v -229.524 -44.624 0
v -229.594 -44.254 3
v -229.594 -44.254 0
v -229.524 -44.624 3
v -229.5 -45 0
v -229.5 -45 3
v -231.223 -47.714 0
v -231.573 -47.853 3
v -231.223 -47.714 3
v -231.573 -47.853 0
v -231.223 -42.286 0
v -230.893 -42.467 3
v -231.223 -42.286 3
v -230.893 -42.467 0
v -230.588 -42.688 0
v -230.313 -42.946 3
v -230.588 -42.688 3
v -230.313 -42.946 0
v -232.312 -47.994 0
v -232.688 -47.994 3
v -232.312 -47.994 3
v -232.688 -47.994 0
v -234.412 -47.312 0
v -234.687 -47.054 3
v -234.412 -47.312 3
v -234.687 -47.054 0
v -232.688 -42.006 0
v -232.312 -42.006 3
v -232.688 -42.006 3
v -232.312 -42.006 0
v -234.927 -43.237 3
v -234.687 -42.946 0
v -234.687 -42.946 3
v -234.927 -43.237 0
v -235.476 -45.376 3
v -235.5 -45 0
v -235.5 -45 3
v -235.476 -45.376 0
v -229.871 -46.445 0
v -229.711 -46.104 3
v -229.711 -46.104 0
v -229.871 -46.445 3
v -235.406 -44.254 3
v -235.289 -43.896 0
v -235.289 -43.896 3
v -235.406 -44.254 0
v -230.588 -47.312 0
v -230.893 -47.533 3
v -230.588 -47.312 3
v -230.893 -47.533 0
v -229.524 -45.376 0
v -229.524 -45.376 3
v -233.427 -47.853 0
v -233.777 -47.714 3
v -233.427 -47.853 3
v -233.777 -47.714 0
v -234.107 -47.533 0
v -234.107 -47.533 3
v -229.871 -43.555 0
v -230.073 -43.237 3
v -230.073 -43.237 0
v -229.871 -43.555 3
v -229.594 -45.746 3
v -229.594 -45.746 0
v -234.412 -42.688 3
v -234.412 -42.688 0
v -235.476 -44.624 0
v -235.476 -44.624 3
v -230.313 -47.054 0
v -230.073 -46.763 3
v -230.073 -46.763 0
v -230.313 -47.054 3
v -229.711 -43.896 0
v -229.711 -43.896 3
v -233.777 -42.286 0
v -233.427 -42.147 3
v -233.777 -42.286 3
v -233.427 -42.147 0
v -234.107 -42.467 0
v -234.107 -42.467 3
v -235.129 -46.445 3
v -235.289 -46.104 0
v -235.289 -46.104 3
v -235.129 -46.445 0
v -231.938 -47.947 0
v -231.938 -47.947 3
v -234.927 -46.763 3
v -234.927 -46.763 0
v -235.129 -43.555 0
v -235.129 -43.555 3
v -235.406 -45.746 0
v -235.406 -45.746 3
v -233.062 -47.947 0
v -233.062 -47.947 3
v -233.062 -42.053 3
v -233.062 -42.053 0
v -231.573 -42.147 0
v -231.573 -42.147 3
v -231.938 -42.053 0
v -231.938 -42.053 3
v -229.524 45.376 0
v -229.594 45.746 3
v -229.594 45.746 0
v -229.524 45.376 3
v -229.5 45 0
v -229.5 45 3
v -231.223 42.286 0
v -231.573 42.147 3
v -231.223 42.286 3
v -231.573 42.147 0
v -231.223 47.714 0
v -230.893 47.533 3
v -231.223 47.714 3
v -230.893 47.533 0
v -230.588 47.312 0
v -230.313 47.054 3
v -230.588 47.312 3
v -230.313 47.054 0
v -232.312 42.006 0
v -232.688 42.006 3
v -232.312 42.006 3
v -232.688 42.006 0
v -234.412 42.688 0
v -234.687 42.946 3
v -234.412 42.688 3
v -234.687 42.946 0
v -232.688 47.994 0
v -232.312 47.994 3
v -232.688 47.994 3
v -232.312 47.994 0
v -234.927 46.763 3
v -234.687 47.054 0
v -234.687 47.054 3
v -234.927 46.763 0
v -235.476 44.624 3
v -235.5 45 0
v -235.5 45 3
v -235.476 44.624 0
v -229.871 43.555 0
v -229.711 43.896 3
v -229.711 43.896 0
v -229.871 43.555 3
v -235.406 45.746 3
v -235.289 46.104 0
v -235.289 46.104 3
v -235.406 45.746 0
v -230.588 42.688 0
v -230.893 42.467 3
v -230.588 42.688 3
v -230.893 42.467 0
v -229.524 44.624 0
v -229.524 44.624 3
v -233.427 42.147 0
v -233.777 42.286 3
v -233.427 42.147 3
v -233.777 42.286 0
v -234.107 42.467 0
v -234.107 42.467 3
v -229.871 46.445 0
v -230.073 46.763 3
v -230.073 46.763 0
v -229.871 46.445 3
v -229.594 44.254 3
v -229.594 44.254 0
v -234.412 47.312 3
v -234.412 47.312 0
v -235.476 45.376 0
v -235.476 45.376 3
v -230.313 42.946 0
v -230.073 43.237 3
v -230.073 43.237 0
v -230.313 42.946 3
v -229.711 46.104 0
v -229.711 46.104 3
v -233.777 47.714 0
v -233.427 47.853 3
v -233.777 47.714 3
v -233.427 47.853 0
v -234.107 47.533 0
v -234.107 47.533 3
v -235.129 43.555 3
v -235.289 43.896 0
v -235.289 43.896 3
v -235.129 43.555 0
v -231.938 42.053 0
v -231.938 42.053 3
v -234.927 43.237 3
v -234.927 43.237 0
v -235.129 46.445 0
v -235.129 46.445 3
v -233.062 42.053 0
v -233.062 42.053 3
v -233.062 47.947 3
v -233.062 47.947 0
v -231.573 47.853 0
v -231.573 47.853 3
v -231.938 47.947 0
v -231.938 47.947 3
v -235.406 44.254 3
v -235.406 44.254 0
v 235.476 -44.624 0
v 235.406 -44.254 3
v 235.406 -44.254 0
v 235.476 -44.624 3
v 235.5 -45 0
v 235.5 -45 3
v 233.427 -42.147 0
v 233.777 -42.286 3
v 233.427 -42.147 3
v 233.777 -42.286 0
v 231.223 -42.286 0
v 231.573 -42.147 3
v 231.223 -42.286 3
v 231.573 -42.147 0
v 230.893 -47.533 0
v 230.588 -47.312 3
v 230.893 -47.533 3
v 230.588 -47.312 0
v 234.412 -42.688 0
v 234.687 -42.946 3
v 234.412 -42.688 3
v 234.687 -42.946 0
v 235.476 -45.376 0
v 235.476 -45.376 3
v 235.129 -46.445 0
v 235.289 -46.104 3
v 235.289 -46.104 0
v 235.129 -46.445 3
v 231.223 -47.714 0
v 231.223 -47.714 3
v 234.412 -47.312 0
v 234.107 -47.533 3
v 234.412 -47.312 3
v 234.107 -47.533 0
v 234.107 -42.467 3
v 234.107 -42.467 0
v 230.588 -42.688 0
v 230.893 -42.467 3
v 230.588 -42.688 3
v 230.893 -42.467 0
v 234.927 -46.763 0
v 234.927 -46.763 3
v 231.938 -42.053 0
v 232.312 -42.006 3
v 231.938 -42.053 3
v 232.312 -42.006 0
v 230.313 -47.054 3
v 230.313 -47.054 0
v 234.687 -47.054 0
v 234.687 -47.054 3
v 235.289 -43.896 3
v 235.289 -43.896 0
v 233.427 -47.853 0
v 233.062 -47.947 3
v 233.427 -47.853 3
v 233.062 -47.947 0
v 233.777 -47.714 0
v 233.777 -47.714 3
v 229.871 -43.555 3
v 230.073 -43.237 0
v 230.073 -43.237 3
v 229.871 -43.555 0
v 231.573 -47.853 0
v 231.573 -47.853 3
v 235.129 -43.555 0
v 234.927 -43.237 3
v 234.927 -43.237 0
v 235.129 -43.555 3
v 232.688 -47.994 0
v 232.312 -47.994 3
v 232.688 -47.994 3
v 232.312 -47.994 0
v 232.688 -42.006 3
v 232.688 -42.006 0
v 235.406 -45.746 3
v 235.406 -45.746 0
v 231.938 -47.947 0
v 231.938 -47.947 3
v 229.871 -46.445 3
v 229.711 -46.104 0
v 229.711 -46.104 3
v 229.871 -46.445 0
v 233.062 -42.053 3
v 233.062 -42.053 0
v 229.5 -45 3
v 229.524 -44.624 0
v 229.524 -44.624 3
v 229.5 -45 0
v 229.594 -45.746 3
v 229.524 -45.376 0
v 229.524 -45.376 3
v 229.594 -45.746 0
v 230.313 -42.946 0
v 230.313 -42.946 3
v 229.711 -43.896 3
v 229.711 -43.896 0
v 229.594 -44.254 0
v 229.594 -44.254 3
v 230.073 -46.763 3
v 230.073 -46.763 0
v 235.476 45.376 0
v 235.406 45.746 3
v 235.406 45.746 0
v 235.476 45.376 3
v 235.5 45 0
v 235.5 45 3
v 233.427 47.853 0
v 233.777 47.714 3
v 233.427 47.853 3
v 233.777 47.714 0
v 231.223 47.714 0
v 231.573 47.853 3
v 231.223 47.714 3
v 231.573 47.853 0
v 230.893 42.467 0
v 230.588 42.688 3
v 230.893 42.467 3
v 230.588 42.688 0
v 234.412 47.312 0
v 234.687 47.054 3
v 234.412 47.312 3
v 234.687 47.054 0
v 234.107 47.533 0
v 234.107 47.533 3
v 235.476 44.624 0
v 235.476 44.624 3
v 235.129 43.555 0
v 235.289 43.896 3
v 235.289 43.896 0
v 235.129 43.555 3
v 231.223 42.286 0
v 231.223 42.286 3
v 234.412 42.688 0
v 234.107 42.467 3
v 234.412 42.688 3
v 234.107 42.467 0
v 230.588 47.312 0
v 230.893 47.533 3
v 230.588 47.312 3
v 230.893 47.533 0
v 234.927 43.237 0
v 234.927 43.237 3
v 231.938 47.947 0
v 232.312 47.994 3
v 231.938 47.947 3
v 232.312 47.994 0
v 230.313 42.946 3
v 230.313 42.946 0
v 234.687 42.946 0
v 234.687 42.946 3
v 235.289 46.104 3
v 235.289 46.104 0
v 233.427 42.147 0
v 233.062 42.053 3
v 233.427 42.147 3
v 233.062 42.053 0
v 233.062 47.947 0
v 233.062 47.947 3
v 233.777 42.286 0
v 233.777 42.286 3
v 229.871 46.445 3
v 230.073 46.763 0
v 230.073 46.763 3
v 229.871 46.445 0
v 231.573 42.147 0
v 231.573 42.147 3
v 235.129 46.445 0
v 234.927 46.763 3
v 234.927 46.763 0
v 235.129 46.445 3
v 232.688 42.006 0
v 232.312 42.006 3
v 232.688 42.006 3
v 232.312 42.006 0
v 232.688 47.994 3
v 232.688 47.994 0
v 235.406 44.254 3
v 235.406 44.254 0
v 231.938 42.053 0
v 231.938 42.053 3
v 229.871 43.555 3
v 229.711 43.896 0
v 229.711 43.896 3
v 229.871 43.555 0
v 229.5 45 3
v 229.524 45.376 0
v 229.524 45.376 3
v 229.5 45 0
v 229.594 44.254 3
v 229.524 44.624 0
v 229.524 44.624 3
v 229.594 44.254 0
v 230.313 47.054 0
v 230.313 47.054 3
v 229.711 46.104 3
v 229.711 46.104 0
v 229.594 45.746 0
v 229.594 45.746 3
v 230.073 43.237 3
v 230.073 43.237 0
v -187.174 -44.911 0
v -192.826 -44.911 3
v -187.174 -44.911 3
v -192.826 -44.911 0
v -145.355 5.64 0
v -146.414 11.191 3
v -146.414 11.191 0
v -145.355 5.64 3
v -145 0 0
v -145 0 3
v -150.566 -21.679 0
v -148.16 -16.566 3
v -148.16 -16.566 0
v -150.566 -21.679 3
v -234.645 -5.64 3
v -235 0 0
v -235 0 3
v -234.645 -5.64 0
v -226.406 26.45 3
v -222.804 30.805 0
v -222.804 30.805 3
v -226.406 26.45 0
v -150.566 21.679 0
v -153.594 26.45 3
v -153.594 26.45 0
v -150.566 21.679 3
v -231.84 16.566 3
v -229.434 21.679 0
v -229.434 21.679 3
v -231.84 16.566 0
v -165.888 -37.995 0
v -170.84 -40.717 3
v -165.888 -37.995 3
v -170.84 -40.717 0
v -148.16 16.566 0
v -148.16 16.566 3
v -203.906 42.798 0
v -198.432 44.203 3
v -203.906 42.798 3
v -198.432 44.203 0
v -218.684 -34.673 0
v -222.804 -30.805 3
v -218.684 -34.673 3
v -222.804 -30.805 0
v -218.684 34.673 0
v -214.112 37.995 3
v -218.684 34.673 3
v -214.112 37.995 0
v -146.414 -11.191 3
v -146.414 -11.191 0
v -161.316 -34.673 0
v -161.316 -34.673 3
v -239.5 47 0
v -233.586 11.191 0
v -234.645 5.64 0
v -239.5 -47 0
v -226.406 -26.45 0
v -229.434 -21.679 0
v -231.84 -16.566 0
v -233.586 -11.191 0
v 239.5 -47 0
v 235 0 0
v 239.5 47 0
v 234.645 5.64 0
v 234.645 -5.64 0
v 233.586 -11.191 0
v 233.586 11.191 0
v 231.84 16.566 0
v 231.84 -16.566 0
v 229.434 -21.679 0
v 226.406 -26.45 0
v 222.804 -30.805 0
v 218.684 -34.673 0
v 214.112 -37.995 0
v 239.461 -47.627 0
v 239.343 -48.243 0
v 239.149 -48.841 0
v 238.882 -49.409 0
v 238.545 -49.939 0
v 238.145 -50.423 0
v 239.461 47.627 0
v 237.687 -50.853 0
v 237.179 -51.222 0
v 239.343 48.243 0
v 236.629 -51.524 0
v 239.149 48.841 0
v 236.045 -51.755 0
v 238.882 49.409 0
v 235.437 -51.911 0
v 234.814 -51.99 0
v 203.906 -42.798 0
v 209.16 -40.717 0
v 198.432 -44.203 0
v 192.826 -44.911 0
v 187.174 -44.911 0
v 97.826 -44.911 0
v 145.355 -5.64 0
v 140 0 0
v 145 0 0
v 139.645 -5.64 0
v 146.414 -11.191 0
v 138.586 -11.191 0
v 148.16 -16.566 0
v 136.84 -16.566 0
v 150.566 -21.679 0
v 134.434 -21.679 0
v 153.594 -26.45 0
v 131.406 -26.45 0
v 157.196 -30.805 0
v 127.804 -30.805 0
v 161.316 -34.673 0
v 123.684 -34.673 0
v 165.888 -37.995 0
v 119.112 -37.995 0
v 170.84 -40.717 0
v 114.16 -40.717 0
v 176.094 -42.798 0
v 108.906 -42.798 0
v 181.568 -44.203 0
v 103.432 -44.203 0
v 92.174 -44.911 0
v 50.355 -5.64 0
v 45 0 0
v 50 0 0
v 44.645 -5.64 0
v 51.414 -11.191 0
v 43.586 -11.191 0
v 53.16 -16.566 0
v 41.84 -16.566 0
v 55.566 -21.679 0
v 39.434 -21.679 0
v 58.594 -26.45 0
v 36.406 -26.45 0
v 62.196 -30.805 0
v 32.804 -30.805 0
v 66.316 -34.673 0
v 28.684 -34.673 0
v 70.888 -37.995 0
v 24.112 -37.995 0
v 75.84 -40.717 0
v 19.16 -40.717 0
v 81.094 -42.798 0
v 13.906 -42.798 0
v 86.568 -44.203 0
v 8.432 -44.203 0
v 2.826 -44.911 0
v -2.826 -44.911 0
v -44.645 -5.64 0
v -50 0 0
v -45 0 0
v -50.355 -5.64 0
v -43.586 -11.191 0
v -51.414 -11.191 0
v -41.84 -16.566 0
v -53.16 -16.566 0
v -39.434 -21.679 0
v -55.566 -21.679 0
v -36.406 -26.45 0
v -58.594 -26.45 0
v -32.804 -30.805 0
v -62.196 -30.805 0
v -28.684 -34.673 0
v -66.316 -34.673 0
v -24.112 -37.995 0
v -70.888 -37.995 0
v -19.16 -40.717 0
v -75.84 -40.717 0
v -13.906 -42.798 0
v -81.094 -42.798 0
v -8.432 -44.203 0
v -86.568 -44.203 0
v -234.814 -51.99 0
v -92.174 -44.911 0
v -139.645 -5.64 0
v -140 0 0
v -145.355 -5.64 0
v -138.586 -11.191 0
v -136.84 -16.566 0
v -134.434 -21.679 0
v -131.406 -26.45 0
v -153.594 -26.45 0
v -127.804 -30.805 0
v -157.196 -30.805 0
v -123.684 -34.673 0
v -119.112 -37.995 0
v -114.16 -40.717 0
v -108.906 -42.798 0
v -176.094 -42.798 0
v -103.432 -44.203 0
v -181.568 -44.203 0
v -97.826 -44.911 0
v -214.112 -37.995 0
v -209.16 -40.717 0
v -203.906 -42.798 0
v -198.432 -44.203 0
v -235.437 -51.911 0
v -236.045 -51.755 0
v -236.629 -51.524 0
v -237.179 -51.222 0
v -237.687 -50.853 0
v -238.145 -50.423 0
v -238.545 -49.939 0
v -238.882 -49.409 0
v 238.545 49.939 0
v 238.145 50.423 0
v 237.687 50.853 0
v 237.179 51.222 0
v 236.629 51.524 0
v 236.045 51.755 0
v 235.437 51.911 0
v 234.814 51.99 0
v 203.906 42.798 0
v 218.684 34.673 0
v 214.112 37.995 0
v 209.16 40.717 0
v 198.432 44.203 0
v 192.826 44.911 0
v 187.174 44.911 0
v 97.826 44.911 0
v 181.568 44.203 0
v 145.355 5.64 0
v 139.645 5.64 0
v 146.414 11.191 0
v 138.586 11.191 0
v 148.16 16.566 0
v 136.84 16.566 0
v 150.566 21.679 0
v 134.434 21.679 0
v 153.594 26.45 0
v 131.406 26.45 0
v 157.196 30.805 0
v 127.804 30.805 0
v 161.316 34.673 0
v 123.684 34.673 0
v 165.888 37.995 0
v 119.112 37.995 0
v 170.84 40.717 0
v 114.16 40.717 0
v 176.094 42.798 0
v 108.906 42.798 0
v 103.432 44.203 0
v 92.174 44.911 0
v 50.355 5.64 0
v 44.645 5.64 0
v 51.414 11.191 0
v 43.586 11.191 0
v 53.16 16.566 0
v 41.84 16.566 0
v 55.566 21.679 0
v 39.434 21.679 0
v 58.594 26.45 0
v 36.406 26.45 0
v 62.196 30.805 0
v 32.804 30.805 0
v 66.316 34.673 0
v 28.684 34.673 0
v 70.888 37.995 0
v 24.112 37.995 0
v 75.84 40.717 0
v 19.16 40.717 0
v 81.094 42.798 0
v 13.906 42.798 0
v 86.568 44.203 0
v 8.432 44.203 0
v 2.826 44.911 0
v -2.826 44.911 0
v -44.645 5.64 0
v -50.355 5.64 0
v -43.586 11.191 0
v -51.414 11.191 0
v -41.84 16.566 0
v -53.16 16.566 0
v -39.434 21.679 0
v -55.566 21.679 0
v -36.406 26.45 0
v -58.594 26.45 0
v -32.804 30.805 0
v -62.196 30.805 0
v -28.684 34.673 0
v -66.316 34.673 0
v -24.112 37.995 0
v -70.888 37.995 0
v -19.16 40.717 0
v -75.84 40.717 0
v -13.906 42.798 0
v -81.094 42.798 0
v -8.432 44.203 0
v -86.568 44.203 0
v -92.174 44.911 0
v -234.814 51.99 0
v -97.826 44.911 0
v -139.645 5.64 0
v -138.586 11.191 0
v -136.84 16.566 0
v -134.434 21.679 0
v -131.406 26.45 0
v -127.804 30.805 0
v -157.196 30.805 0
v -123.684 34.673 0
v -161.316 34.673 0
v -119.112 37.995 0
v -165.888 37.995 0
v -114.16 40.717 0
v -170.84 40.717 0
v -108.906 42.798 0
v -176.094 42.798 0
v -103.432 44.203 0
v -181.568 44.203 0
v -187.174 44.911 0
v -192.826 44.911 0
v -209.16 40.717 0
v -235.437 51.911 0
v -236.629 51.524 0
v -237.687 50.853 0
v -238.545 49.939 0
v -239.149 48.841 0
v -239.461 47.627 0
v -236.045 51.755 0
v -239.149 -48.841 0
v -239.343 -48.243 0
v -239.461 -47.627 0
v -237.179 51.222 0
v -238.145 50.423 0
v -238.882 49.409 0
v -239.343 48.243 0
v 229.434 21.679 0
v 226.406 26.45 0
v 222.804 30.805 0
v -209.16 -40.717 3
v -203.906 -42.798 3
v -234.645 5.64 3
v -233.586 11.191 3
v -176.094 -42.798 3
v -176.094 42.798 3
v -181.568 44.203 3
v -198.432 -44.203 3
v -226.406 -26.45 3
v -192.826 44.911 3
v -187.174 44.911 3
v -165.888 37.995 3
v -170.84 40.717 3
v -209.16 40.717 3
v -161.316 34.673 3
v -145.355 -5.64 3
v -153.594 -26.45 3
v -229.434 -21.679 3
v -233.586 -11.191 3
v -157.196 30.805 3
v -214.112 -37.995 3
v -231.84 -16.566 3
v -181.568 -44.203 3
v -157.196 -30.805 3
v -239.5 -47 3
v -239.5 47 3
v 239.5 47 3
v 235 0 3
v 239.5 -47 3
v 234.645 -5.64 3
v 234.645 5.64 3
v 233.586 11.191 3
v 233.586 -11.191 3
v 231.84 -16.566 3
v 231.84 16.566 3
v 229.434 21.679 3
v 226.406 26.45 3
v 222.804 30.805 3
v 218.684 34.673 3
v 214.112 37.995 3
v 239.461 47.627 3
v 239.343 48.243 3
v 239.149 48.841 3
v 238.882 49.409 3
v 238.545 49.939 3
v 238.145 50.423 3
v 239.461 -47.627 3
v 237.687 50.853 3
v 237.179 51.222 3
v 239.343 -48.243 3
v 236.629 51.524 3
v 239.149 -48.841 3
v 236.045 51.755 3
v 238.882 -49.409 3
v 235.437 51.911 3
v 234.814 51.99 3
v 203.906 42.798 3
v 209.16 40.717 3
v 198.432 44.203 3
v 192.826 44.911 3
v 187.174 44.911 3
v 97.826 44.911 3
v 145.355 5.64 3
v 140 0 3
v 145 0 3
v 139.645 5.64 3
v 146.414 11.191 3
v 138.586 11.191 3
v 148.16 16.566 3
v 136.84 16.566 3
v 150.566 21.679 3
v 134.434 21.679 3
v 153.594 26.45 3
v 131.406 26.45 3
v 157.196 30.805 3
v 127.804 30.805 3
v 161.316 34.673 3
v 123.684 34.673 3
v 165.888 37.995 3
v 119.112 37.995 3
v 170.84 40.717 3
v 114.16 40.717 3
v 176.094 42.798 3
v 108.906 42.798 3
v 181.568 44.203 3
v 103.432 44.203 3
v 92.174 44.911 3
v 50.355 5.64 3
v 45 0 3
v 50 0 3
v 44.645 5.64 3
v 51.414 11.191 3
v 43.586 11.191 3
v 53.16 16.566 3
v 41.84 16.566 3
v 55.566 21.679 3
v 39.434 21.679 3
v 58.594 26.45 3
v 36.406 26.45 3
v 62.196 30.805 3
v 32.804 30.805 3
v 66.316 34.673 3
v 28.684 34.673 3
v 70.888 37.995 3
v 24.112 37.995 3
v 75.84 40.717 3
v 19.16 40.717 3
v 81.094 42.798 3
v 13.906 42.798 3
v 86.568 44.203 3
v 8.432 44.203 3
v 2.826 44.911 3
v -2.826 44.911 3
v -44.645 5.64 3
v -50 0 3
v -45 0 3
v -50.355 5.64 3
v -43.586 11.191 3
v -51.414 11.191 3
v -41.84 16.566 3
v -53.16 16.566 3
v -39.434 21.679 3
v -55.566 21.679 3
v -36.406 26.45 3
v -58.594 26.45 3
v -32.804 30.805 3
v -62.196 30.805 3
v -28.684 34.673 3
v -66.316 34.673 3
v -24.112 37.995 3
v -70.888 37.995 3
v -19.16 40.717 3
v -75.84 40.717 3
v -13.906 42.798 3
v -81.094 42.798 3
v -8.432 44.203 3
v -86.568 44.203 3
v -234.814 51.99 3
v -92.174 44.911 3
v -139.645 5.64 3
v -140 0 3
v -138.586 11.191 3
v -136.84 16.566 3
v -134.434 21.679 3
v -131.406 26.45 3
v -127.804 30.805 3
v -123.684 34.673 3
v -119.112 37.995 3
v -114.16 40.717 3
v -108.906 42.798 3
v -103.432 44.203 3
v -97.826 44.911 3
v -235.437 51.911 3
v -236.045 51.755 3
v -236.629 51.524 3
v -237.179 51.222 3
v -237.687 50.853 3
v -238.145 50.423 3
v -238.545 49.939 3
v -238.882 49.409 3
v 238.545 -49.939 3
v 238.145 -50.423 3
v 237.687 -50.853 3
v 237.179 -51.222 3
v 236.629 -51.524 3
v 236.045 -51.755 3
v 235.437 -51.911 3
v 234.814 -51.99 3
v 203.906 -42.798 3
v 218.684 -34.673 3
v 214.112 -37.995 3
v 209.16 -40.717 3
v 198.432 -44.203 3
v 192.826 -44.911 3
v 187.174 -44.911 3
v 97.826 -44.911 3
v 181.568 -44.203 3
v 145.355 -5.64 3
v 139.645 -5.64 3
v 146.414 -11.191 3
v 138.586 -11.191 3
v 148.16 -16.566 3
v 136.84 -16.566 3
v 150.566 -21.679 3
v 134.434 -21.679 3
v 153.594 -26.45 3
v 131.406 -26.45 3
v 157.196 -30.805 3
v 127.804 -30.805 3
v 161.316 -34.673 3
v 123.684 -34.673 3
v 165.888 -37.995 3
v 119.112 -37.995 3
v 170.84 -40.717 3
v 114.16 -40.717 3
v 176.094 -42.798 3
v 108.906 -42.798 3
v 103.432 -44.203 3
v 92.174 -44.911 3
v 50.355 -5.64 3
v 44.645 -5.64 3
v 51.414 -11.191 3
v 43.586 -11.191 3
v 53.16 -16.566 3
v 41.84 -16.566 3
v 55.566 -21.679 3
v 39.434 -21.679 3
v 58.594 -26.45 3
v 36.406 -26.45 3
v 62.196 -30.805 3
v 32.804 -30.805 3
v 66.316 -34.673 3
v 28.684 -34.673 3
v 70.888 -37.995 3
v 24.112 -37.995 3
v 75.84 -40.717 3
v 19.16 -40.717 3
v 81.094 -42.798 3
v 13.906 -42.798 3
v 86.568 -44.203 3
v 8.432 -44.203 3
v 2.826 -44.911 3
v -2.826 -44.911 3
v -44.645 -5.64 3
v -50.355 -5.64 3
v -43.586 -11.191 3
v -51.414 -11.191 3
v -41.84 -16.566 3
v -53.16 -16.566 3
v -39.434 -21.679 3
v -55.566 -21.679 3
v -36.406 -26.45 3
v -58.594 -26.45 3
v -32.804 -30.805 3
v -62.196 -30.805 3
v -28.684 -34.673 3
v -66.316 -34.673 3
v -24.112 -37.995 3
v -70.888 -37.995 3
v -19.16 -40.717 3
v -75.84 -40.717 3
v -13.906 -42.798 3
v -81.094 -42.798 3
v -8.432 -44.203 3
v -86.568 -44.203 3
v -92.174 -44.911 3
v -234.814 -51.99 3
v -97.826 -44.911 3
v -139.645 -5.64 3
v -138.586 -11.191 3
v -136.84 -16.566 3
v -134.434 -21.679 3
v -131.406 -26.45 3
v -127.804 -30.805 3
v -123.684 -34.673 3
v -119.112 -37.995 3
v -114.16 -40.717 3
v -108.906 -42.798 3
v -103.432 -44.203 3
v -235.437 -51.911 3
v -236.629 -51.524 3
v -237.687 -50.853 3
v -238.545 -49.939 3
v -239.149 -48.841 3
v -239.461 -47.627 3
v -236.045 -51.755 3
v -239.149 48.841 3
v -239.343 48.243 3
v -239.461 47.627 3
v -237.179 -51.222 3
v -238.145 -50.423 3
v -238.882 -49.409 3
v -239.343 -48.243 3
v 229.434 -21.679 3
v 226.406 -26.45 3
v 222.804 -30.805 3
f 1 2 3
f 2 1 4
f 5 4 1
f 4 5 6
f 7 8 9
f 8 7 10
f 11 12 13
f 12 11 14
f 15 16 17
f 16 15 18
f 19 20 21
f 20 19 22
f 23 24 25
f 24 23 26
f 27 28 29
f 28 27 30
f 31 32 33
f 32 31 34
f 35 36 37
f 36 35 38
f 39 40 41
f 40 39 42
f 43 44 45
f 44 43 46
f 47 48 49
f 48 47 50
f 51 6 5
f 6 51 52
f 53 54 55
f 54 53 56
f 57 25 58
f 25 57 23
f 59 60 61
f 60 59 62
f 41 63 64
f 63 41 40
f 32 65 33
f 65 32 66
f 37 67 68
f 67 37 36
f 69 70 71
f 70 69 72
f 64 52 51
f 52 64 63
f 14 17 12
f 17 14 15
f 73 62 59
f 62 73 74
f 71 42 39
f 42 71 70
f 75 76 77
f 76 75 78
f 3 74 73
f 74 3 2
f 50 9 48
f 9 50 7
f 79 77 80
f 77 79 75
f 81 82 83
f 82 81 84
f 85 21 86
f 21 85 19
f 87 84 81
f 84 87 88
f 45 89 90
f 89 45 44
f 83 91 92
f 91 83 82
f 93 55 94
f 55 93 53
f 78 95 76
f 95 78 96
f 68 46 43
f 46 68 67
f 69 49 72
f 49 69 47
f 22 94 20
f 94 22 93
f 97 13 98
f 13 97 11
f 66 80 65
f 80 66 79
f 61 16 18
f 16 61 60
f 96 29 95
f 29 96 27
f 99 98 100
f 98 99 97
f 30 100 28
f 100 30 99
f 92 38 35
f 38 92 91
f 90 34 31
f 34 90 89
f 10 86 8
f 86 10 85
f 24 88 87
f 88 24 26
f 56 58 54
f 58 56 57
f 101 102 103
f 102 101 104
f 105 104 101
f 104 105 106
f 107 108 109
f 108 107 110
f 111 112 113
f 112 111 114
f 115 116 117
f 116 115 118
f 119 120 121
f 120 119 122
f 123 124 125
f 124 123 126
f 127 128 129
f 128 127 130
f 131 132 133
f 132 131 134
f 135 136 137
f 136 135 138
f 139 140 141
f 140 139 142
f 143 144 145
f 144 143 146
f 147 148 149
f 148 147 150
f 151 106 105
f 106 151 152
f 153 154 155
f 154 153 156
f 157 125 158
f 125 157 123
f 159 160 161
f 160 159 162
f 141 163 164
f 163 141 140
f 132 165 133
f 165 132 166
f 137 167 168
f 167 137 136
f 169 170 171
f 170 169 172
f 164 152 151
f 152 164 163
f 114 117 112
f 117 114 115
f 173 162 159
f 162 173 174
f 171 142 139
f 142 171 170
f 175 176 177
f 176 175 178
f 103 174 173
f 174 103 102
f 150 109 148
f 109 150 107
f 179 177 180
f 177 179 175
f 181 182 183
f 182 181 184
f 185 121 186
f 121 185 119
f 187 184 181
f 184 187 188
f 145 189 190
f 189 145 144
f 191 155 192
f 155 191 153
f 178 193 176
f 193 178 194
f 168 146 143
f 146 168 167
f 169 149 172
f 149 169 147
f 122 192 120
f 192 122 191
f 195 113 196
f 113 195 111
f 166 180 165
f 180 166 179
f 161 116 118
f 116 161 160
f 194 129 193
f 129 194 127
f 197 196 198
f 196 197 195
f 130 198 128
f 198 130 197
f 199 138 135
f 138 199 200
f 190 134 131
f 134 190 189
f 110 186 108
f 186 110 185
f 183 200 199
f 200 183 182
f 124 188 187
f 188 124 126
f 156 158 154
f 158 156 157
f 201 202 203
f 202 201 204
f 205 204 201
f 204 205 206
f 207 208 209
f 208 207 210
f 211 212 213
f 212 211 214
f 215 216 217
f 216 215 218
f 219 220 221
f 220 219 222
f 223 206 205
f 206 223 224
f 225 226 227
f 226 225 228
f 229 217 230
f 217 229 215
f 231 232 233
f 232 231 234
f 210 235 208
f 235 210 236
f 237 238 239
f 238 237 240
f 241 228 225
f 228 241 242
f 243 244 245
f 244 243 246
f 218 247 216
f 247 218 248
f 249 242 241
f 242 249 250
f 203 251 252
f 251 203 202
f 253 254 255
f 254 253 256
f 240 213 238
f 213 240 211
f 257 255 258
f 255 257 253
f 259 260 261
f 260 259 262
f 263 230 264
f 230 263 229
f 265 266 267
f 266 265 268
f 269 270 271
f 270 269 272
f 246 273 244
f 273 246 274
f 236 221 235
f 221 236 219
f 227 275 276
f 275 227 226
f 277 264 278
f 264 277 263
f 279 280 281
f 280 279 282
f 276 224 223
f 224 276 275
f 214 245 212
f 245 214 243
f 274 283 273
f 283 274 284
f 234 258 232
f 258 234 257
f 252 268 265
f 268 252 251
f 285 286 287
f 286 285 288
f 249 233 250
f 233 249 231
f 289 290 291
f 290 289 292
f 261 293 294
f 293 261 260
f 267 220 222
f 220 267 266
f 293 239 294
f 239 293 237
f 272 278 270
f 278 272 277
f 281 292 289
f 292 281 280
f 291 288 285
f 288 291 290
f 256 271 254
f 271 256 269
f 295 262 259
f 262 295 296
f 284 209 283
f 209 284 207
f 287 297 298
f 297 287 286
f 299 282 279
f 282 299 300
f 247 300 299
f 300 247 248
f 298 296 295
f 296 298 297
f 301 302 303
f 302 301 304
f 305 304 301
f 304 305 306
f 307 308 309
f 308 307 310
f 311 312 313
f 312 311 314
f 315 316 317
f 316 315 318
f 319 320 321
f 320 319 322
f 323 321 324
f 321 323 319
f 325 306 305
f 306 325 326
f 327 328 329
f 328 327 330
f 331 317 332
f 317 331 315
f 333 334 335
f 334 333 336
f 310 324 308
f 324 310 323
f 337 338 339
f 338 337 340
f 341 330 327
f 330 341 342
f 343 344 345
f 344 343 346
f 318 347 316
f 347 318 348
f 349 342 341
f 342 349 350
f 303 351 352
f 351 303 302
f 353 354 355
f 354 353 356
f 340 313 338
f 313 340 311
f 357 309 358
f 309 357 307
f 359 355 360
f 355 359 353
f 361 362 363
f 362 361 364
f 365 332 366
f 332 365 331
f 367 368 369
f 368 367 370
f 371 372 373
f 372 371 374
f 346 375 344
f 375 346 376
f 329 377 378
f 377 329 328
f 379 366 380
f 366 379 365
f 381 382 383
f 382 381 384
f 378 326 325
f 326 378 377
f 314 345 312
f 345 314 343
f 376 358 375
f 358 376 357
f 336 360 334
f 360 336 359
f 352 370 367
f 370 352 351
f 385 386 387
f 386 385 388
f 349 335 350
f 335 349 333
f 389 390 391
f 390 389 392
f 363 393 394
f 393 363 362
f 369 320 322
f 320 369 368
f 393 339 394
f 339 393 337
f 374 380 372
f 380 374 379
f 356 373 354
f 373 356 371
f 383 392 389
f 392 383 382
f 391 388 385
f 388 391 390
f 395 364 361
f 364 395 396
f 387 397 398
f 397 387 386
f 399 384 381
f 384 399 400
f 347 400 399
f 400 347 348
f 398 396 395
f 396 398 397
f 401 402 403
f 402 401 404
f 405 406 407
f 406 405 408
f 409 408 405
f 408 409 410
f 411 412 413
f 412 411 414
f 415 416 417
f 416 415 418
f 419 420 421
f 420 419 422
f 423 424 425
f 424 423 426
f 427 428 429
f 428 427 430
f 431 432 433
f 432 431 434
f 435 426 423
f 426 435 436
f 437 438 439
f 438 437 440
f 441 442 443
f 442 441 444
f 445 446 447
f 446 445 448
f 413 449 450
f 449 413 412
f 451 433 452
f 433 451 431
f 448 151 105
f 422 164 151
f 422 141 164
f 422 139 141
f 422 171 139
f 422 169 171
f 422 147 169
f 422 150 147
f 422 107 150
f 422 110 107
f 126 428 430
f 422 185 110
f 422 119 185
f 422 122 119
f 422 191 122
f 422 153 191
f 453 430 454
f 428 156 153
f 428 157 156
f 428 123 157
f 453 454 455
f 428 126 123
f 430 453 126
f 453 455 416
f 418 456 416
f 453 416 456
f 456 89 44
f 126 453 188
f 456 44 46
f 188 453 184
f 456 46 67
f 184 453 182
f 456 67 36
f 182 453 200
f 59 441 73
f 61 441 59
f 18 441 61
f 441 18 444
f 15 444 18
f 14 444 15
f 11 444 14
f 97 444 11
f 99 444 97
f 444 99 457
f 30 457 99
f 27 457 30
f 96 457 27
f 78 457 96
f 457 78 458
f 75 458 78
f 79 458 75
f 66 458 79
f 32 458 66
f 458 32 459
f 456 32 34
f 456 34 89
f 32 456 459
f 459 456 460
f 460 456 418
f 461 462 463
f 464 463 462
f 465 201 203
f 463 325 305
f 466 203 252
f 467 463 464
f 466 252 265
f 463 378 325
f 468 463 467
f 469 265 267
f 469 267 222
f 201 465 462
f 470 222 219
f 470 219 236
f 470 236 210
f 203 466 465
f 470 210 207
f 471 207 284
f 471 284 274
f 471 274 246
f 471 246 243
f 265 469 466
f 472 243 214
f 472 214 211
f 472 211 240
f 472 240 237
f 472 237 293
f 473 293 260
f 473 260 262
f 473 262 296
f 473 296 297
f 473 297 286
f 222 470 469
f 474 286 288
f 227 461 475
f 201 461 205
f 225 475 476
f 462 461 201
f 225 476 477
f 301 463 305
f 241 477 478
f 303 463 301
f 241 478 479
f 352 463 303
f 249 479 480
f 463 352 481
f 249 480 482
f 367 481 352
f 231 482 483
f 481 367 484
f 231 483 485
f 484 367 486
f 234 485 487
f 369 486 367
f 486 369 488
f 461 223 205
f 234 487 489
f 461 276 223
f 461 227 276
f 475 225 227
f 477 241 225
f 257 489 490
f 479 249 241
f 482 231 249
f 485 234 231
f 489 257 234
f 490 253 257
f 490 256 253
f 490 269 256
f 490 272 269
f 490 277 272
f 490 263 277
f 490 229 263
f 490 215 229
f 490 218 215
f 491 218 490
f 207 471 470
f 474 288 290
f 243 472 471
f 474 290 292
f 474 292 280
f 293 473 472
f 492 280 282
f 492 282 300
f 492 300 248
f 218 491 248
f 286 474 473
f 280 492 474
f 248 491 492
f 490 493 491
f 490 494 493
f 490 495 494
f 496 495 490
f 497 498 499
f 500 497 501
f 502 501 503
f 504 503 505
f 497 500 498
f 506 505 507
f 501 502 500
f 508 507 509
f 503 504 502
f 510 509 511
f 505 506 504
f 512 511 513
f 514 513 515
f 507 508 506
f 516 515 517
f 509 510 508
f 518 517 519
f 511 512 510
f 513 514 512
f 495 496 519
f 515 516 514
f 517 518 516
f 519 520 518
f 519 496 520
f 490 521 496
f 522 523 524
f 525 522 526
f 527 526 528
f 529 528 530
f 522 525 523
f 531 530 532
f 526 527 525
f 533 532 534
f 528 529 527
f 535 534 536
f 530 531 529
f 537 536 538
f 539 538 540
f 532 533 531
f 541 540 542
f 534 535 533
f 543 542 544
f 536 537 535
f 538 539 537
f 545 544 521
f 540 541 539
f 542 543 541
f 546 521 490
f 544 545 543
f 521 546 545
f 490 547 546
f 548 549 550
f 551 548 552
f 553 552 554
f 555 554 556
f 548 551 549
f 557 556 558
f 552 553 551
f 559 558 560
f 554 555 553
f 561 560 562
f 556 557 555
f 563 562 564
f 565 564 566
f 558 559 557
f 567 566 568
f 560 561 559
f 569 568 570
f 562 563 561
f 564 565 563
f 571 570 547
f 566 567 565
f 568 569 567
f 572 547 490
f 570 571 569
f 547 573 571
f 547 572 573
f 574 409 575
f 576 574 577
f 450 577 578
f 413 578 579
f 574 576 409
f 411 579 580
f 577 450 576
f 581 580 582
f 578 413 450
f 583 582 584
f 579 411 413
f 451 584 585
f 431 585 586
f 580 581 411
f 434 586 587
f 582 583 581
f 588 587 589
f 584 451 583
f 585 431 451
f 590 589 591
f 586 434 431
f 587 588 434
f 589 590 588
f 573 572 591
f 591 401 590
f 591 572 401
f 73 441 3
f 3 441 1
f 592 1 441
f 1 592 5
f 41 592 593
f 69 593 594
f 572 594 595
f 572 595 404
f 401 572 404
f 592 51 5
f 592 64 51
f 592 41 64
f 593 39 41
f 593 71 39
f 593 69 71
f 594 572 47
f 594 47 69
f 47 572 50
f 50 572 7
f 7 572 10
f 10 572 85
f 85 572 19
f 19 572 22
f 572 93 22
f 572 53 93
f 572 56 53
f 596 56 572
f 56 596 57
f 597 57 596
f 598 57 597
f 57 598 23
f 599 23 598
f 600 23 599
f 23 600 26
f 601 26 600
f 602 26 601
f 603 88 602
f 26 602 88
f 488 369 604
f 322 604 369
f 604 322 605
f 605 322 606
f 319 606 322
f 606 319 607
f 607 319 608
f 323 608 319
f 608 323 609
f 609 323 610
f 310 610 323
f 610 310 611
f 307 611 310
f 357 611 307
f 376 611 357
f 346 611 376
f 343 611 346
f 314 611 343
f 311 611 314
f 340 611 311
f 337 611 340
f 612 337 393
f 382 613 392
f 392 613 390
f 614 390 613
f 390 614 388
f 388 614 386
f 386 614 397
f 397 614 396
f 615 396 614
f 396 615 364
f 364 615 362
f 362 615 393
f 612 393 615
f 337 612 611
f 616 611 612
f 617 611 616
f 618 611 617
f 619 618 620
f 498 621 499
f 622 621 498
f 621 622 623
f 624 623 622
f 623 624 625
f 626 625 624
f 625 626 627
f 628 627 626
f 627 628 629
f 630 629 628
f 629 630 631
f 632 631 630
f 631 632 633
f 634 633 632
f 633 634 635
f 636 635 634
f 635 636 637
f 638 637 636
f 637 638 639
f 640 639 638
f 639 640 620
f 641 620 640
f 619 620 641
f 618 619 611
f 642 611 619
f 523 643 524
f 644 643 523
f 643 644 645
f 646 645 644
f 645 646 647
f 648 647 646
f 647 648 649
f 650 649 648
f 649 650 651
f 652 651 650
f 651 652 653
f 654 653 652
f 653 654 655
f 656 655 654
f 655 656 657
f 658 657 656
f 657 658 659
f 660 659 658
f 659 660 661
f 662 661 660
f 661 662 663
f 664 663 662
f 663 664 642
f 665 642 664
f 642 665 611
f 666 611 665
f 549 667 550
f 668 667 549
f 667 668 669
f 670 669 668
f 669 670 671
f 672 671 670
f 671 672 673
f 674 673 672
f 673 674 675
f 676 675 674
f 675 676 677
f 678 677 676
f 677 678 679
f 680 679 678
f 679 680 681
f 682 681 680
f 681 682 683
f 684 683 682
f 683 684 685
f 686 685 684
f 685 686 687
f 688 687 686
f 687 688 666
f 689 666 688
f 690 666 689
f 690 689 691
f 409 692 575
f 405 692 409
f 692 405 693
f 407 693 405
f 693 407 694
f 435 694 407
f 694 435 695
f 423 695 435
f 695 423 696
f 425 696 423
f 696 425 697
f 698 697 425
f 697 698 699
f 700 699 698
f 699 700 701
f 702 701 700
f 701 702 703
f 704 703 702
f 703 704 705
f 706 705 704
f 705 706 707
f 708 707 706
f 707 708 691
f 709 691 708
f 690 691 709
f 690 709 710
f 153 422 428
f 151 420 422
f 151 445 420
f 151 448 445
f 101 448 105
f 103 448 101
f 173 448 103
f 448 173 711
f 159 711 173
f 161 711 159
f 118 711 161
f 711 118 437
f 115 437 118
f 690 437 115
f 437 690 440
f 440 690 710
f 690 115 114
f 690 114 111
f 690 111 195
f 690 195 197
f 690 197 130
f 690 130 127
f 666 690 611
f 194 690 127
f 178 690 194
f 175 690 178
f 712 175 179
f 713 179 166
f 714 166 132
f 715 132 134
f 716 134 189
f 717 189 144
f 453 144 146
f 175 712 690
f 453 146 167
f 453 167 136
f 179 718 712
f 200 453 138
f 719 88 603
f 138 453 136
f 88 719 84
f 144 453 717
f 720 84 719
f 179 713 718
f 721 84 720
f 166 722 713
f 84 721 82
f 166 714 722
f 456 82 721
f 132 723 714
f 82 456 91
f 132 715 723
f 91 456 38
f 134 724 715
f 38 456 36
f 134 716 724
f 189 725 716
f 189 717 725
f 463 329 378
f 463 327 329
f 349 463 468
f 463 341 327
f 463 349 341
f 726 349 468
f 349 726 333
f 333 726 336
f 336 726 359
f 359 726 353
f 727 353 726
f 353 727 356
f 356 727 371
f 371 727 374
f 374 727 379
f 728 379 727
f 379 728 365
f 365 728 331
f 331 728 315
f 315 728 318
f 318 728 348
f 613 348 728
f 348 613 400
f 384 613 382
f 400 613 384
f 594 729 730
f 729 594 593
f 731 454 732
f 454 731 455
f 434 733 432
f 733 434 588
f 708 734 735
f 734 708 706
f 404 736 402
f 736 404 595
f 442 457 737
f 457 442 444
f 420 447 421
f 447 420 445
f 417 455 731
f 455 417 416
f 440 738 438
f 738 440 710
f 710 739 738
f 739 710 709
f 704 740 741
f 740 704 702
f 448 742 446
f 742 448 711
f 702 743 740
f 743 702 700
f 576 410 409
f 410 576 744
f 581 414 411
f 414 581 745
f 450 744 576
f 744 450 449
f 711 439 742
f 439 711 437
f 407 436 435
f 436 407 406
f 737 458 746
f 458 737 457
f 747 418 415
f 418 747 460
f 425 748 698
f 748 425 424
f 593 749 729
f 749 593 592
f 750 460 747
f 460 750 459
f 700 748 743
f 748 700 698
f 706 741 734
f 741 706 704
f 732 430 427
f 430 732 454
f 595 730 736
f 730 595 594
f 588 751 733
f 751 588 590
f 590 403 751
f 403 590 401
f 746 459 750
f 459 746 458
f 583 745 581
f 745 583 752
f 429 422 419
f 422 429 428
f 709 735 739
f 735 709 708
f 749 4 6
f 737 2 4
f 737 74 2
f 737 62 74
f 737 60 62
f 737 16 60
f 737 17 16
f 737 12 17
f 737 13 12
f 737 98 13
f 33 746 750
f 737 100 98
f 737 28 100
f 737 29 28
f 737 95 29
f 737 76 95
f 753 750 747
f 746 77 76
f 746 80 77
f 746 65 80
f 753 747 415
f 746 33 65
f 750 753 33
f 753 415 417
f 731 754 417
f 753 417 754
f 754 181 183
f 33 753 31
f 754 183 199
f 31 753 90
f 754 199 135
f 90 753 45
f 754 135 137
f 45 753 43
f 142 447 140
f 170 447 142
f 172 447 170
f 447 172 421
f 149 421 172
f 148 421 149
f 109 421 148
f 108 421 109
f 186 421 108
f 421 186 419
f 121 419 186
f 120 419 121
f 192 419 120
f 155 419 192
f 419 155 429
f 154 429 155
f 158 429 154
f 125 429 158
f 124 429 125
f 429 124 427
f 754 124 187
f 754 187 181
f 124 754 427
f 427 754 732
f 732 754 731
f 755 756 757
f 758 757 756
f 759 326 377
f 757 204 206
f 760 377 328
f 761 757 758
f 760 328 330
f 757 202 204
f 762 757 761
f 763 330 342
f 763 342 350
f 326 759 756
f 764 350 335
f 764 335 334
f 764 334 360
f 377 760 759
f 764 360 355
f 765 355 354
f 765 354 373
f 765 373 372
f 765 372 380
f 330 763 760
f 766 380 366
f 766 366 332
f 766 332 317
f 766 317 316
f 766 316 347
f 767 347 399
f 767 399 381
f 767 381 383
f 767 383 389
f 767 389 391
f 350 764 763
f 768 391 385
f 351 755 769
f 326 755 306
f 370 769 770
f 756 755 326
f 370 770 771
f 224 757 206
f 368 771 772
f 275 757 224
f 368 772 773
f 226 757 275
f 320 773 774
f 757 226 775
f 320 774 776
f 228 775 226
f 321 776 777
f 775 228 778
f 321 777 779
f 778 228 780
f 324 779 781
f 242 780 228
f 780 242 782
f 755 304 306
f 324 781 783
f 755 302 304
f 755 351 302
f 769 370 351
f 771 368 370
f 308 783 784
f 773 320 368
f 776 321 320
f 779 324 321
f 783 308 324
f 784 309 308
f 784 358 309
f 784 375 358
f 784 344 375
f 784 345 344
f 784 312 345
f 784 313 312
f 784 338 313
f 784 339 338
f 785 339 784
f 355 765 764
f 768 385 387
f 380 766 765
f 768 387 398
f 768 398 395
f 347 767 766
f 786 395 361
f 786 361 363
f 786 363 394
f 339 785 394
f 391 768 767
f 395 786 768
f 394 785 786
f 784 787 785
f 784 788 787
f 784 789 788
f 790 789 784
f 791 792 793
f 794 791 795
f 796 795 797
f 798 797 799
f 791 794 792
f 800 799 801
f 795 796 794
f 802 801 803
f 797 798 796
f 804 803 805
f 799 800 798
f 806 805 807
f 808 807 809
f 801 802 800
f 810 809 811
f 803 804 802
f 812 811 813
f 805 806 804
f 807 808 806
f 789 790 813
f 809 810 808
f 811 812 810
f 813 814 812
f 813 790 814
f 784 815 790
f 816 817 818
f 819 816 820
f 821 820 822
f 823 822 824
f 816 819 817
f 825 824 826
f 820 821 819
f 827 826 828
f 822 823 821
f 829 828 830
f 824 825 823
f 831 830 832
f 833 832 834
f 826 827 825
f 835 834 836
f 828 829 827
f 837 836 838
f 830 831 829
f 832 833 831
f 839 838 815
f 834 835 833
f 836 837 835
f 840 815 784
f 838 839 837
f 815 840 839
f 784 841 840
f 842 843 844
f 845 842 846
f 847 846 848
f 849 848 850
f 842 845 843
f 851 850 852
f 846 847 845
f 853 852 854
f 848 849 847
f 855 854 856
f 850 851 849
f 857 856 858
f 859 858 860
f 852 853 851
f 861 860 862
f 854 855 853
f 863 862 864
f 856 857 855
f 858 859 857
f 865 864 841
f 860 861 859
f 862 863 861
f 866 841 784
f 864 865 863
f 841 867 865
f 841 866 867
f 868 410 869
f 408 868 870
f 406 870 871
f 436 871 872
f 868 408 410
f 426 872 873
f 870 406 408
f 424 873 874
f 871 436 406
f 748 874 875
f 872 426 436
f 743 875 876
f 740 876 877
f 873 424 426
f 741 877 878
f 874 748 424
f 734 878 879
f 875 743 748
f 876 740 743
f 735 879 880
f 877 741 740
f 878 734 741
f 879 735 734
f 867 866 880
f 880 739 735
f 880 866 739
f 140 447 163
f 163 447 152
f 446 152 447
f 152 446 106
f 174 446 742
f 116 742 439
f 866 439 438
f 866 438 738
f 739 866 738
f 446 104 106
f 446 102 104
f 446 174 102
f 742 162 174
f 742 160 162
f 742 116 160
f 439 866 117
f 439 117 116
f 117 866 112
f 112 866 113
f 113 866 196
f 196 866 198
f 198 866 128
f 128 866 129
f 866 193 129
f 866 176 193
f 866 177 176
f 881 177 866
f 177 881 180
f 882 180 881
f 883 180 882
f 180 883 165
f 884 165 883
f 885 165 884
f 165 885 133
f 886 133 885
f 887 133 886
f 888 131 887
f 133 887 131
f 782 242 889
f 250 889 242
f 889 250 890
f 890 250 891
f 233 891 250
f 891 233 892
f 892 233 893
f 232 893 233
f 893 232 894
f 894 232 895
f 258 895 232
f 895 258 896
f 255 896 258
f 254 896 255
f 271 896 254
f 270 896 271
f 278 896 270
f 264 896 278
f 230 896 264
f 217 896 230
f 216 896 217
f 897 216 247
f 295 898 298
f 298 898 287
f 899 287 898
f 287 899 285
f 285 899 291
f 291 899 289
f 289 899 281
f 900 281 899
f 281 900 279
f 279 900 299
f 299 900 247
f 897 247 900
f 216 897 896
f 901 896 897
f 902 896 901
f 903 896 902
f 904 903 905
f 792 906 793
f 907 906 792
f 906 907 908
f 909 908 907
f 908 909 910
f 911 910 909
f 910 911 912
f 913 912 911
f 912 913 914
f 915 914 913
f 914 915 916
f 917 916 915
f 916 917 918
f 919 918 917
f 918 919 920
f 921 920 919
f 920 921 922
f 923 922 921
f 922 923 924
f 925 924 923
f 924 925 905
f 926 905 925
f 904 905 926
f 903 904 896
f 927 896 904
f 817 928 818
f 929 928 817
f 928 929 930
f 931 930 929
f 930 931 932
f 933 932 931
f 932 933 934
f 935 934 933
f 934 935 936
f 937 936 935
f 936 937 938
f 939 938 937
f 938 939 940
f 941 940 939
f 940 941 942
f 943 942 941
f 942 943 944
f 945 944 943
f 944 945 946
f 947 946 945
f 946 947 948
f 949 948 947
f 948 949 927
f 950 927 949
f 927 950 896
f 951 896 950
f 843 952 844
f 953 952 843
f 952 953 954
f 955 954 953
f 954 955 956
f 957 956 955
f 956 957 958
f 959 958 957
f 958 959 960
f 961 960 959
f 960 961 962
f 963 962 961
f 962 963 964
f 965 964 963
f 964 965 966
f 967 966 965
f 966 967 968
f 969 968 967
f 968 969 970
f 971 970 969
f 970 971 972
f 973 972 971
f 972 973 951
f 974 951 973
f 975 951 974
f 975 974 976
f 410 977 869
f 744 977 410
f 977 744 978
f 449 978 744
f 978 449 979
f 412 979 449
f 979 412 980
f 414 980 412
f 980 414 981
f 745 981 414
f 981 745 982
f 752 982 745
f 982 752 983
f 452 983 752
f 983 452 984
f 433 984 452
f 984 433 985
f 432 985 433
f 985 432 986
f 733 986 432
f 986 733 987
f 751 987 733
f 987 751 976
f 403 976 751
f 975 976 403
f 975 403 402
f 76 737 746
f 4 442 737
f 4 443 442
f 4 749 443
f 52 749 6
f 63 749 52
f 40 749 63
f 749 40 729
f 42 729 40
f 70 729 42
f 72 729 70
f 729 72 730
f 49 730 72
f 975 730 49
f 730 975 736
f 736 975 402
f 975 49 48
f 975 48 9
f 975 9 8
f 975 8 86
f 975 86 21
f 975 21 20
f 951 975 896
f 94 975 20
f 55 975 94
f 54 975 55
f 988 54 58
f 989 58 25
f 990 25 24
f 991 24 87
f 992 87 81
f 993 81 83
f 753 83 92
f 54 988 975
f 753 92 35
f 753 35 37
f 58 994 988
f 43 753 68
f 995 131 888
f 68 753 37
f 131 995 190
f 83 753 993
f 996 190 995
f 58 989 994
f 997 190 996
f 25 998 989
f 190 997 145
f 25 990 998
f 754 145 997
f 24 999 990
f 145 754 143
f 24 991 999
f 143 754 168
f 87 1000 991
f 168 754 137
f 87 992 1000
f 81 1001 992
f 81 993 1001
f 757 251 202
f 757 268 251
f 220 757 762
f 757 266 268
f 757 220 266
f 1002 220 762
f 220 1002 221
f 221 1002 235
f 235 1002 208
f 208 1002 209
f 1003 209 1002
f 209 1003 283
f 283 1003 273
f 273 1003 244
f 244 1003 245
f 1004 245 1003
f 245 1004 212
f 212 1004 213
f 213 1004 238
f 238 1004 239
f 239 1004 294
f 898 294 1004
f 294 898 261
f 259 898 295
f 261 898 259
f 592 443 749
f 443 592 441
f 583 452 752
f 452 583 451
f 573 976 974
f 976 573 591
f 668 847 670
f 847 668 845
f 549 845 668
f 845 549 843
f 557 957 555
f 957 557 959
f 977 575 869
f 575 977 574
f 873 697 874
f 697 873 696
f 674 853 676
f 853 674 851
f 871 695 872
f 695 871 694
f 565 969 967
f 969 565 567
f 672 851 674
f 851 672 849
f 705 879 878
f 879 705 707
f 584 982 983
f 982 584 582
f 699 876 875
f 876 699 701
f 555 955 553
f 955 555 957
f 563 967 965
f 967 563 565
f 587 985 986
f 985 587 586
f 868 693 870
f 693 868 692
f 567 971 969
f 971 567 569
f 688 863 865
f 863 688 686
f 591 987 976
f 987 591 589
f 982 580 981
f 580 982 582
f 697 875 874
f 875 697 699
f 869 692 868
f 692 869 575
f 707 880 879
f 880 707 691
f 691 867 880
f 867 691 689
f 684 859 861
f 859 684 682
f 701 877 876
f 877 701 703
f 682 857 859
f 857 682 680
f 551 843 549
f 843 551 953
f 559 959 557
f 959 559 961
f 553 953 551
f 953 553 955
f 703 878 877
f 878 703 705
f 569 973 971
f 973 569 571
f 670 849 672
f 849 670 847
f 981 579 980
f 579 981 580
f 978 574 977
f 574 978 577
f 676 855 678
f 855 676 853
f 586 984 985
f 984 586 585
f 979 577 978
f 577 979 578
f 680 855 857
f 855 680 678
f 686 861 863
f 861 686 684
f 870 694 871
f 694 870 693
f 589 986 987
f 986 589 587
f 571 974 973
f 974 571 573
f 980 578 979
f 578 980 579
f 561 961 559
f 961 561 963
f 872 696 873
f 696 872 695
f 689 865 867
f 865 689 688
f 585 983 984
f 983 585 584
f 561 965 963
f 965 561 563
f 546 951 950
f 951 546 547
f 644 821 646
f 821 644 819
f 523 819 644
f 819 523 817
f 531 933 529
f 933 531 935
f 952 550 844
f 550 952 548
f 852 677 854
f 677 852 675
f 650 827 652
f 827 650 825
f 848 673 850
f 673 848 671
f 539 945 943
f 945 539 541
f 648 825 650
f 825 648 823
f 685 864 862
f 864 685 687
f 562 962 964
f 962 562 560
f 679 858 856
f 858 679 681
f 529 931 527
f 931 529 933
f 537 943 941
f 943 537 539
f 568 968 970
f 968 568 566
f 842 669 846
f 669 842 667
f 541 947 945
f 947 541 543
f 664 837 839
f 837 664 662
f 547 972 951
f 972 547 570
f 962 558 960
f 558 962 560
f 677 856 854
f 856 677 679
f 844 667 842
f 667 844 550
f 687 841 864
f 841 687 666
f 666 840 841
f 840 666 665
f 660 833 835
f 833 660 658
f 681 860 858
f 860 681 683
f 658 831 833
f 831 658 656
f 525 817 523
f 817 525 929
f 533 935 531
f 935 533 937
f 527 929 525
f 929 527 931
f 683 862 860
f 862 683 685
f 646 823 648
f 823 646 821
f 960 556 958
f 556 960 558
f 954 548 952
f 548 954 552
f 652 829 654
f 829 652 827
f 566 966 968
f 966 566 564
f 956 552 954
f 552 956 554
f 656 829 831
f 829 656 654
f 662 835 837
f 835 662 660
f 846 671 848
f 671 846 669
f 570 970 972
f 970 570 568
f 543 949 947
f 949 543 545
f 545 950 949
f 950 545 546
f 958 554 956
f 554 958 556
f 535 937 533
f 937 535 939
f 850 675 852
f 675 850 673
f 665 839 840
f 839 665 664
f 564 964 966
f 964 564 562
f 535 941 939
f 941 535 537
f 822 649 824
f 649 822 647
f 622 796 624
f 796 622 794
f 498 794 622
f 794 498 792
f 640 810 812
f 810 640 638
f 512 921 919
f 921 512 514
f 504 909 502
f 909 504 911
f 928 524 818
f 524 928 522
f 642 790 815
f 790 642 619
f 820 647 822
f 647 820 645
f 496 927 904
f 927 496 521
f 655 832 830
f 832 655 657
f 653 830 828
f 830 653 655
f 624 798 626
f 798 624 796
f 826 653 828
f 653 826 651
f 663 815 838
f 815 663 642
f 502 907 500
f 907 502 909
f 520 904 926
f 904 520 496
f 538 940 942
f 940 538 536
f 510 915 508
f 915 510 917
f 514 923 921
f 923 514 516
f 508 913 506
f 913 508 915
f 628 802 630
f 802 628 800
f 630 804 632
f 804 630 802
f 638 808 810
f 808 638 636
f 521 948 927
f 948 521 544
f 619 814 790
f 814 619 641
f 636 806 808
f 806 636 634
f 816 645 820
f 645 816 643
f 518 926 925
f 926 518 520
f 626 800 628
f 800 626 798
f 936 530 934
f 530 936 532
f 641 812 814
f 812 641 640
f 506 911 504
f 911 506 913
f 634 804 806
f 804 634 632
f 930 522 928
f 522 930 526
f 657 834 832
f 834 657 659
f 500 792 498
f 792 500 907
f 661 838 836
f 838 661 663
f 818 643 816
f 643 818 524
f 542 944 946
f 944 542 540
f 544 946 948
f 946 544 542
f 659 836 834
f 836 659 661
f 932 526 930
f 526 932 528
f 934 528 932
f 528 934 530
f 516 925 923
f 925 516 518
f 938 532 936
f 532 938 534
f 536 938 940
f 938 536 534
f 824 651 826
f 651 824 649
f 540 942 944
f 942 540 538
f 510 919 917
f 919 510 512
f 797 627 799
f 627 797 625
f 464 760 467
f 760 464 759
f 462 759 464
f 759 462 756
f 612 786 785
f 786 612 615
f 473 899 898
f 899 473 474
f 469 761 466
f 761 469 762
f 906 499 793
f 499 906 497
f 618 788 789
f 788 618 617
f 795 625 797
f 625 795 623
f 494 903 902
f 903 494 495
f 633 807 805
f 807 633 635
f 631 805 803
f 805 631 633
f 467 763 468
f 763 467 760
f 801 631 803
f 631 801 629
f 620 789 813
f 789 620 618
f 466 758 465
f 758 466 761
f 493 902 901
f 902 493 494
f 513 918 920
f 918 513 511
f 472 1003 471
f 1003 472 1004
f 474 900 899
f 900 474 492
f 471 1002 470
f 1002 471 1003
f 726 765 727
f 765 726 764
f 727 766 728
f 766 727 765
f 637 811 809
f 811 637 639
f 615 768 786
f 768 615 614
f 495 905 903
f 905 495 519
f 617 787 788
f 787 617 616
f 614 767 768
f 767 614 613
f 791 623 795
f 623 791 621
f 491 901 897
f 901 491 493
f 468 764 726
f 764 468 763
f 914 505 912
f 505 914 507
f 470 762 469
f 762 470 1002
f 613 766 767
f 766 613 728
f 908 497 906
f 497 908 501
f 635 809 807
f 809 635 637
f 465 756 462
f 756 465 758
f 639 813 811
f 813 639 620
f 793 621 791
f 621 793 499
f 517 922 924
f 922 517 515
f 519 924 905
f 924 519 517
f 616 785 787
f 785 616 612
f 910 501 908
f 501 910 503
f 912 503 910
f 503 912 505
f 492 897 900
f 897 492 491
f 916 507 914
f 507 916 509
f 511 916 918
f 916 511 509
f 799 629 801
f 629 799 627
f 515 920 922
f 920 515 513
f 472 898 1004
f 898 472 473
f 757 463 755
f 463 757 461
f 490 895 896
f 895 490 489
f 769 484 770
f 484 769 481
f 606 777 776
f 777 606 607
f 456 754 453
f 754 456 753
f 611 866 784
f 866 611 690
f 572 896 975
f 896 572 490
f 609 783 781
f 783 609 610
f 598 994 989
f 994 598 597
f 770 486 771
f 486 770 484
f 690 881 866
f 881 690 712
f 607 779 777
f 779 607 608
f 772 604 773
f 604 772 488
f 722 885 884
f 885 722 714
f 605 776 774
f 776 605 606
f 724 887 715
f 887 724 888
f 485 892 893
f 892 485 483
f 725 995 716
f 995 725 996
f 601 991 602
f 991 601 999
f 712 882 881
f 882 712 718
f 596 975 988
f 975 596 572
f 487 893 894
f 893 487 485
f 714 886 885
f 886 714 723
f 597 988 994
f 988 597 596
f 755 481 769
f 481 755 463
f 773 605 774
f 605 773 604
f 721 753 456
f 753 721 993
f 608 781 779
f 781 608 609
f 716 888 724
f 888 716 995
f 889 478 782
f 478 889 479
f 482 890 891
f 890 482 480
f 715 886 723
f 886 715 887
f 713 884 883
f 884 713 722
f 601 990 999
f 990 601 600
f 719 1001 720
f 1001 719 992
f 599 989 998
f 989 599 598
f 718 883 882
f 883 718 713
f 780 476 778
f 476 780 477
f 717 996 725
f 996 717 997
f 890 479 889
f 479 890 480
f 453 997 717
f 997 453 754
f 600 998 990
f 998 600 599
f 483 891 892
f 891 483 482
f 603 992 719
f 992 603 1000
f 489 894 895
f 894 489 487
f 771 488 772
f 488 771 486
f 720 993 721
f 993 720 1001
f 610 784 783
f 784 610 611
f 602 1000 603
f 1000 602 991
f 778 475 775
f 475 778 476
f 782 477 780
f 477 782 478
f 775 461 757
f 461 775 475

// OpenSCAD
$fn = 50;


difference() {
	union() {
		hull() {
			translate(v = [-234.5000000000, 47.0000000000, 0]) {
				cylinder(h = 3, r = 5);
			}
			translate(v = [234.5000000000, 47.0000000000, 0]) {
				cylinder(h = 3, r = 5);
			}
			translate(v = [-234.5000000000, -47.0000000000, 0]) {
				cylinder(h = 3, r = 5);
			}
			translate(v = [234.5000000000, -47.0000000000, 0]) {
				cylinder(h = 3, r = 5);
			}
		}
	}
	union() {
		#translate(v = [-232.5000000000, -45.0000000000, -100.0000000000]) {
			cylinder(h = 200, r = 3.0000000000);
		}
		#translate(v = [-232.5000000000, 45.0000000000, -100.0000000000]) {
			cylinder(h = 200, r = 3.0000000000);
		}
		#translate(v = [232.5000000000, -45.0000000000, -100.0000000000]) {
			cylinder(h = 200, r = 3.0000000000);
		}
		#translate(v = [232.5000000000, 45.0000000000, -100.0000000000]) {
			cylinder(h = 200, r = 3.0000000000);
		}
		#translate(v = [-190.0000000000, 0, 0]) {
			cylinder(h = 3, r = 45.0000000000);
		}
		#translate(v = [-95.0000000000, 0, 0]) {
			cylinder(h = 3, r = 45.0000000000);
		}
		#cylinder(h = 3, r = 45.0000000000);
		#translate(v = [95.0000000000, 0, 0]) {
			cylinder(h = 3, r = 45.0000000000);
		}
		#translate(v = [190.0000000000, 0, 0]) {
			cylinder(h = 3, r = 45.0000000000);
		}
	}
}
